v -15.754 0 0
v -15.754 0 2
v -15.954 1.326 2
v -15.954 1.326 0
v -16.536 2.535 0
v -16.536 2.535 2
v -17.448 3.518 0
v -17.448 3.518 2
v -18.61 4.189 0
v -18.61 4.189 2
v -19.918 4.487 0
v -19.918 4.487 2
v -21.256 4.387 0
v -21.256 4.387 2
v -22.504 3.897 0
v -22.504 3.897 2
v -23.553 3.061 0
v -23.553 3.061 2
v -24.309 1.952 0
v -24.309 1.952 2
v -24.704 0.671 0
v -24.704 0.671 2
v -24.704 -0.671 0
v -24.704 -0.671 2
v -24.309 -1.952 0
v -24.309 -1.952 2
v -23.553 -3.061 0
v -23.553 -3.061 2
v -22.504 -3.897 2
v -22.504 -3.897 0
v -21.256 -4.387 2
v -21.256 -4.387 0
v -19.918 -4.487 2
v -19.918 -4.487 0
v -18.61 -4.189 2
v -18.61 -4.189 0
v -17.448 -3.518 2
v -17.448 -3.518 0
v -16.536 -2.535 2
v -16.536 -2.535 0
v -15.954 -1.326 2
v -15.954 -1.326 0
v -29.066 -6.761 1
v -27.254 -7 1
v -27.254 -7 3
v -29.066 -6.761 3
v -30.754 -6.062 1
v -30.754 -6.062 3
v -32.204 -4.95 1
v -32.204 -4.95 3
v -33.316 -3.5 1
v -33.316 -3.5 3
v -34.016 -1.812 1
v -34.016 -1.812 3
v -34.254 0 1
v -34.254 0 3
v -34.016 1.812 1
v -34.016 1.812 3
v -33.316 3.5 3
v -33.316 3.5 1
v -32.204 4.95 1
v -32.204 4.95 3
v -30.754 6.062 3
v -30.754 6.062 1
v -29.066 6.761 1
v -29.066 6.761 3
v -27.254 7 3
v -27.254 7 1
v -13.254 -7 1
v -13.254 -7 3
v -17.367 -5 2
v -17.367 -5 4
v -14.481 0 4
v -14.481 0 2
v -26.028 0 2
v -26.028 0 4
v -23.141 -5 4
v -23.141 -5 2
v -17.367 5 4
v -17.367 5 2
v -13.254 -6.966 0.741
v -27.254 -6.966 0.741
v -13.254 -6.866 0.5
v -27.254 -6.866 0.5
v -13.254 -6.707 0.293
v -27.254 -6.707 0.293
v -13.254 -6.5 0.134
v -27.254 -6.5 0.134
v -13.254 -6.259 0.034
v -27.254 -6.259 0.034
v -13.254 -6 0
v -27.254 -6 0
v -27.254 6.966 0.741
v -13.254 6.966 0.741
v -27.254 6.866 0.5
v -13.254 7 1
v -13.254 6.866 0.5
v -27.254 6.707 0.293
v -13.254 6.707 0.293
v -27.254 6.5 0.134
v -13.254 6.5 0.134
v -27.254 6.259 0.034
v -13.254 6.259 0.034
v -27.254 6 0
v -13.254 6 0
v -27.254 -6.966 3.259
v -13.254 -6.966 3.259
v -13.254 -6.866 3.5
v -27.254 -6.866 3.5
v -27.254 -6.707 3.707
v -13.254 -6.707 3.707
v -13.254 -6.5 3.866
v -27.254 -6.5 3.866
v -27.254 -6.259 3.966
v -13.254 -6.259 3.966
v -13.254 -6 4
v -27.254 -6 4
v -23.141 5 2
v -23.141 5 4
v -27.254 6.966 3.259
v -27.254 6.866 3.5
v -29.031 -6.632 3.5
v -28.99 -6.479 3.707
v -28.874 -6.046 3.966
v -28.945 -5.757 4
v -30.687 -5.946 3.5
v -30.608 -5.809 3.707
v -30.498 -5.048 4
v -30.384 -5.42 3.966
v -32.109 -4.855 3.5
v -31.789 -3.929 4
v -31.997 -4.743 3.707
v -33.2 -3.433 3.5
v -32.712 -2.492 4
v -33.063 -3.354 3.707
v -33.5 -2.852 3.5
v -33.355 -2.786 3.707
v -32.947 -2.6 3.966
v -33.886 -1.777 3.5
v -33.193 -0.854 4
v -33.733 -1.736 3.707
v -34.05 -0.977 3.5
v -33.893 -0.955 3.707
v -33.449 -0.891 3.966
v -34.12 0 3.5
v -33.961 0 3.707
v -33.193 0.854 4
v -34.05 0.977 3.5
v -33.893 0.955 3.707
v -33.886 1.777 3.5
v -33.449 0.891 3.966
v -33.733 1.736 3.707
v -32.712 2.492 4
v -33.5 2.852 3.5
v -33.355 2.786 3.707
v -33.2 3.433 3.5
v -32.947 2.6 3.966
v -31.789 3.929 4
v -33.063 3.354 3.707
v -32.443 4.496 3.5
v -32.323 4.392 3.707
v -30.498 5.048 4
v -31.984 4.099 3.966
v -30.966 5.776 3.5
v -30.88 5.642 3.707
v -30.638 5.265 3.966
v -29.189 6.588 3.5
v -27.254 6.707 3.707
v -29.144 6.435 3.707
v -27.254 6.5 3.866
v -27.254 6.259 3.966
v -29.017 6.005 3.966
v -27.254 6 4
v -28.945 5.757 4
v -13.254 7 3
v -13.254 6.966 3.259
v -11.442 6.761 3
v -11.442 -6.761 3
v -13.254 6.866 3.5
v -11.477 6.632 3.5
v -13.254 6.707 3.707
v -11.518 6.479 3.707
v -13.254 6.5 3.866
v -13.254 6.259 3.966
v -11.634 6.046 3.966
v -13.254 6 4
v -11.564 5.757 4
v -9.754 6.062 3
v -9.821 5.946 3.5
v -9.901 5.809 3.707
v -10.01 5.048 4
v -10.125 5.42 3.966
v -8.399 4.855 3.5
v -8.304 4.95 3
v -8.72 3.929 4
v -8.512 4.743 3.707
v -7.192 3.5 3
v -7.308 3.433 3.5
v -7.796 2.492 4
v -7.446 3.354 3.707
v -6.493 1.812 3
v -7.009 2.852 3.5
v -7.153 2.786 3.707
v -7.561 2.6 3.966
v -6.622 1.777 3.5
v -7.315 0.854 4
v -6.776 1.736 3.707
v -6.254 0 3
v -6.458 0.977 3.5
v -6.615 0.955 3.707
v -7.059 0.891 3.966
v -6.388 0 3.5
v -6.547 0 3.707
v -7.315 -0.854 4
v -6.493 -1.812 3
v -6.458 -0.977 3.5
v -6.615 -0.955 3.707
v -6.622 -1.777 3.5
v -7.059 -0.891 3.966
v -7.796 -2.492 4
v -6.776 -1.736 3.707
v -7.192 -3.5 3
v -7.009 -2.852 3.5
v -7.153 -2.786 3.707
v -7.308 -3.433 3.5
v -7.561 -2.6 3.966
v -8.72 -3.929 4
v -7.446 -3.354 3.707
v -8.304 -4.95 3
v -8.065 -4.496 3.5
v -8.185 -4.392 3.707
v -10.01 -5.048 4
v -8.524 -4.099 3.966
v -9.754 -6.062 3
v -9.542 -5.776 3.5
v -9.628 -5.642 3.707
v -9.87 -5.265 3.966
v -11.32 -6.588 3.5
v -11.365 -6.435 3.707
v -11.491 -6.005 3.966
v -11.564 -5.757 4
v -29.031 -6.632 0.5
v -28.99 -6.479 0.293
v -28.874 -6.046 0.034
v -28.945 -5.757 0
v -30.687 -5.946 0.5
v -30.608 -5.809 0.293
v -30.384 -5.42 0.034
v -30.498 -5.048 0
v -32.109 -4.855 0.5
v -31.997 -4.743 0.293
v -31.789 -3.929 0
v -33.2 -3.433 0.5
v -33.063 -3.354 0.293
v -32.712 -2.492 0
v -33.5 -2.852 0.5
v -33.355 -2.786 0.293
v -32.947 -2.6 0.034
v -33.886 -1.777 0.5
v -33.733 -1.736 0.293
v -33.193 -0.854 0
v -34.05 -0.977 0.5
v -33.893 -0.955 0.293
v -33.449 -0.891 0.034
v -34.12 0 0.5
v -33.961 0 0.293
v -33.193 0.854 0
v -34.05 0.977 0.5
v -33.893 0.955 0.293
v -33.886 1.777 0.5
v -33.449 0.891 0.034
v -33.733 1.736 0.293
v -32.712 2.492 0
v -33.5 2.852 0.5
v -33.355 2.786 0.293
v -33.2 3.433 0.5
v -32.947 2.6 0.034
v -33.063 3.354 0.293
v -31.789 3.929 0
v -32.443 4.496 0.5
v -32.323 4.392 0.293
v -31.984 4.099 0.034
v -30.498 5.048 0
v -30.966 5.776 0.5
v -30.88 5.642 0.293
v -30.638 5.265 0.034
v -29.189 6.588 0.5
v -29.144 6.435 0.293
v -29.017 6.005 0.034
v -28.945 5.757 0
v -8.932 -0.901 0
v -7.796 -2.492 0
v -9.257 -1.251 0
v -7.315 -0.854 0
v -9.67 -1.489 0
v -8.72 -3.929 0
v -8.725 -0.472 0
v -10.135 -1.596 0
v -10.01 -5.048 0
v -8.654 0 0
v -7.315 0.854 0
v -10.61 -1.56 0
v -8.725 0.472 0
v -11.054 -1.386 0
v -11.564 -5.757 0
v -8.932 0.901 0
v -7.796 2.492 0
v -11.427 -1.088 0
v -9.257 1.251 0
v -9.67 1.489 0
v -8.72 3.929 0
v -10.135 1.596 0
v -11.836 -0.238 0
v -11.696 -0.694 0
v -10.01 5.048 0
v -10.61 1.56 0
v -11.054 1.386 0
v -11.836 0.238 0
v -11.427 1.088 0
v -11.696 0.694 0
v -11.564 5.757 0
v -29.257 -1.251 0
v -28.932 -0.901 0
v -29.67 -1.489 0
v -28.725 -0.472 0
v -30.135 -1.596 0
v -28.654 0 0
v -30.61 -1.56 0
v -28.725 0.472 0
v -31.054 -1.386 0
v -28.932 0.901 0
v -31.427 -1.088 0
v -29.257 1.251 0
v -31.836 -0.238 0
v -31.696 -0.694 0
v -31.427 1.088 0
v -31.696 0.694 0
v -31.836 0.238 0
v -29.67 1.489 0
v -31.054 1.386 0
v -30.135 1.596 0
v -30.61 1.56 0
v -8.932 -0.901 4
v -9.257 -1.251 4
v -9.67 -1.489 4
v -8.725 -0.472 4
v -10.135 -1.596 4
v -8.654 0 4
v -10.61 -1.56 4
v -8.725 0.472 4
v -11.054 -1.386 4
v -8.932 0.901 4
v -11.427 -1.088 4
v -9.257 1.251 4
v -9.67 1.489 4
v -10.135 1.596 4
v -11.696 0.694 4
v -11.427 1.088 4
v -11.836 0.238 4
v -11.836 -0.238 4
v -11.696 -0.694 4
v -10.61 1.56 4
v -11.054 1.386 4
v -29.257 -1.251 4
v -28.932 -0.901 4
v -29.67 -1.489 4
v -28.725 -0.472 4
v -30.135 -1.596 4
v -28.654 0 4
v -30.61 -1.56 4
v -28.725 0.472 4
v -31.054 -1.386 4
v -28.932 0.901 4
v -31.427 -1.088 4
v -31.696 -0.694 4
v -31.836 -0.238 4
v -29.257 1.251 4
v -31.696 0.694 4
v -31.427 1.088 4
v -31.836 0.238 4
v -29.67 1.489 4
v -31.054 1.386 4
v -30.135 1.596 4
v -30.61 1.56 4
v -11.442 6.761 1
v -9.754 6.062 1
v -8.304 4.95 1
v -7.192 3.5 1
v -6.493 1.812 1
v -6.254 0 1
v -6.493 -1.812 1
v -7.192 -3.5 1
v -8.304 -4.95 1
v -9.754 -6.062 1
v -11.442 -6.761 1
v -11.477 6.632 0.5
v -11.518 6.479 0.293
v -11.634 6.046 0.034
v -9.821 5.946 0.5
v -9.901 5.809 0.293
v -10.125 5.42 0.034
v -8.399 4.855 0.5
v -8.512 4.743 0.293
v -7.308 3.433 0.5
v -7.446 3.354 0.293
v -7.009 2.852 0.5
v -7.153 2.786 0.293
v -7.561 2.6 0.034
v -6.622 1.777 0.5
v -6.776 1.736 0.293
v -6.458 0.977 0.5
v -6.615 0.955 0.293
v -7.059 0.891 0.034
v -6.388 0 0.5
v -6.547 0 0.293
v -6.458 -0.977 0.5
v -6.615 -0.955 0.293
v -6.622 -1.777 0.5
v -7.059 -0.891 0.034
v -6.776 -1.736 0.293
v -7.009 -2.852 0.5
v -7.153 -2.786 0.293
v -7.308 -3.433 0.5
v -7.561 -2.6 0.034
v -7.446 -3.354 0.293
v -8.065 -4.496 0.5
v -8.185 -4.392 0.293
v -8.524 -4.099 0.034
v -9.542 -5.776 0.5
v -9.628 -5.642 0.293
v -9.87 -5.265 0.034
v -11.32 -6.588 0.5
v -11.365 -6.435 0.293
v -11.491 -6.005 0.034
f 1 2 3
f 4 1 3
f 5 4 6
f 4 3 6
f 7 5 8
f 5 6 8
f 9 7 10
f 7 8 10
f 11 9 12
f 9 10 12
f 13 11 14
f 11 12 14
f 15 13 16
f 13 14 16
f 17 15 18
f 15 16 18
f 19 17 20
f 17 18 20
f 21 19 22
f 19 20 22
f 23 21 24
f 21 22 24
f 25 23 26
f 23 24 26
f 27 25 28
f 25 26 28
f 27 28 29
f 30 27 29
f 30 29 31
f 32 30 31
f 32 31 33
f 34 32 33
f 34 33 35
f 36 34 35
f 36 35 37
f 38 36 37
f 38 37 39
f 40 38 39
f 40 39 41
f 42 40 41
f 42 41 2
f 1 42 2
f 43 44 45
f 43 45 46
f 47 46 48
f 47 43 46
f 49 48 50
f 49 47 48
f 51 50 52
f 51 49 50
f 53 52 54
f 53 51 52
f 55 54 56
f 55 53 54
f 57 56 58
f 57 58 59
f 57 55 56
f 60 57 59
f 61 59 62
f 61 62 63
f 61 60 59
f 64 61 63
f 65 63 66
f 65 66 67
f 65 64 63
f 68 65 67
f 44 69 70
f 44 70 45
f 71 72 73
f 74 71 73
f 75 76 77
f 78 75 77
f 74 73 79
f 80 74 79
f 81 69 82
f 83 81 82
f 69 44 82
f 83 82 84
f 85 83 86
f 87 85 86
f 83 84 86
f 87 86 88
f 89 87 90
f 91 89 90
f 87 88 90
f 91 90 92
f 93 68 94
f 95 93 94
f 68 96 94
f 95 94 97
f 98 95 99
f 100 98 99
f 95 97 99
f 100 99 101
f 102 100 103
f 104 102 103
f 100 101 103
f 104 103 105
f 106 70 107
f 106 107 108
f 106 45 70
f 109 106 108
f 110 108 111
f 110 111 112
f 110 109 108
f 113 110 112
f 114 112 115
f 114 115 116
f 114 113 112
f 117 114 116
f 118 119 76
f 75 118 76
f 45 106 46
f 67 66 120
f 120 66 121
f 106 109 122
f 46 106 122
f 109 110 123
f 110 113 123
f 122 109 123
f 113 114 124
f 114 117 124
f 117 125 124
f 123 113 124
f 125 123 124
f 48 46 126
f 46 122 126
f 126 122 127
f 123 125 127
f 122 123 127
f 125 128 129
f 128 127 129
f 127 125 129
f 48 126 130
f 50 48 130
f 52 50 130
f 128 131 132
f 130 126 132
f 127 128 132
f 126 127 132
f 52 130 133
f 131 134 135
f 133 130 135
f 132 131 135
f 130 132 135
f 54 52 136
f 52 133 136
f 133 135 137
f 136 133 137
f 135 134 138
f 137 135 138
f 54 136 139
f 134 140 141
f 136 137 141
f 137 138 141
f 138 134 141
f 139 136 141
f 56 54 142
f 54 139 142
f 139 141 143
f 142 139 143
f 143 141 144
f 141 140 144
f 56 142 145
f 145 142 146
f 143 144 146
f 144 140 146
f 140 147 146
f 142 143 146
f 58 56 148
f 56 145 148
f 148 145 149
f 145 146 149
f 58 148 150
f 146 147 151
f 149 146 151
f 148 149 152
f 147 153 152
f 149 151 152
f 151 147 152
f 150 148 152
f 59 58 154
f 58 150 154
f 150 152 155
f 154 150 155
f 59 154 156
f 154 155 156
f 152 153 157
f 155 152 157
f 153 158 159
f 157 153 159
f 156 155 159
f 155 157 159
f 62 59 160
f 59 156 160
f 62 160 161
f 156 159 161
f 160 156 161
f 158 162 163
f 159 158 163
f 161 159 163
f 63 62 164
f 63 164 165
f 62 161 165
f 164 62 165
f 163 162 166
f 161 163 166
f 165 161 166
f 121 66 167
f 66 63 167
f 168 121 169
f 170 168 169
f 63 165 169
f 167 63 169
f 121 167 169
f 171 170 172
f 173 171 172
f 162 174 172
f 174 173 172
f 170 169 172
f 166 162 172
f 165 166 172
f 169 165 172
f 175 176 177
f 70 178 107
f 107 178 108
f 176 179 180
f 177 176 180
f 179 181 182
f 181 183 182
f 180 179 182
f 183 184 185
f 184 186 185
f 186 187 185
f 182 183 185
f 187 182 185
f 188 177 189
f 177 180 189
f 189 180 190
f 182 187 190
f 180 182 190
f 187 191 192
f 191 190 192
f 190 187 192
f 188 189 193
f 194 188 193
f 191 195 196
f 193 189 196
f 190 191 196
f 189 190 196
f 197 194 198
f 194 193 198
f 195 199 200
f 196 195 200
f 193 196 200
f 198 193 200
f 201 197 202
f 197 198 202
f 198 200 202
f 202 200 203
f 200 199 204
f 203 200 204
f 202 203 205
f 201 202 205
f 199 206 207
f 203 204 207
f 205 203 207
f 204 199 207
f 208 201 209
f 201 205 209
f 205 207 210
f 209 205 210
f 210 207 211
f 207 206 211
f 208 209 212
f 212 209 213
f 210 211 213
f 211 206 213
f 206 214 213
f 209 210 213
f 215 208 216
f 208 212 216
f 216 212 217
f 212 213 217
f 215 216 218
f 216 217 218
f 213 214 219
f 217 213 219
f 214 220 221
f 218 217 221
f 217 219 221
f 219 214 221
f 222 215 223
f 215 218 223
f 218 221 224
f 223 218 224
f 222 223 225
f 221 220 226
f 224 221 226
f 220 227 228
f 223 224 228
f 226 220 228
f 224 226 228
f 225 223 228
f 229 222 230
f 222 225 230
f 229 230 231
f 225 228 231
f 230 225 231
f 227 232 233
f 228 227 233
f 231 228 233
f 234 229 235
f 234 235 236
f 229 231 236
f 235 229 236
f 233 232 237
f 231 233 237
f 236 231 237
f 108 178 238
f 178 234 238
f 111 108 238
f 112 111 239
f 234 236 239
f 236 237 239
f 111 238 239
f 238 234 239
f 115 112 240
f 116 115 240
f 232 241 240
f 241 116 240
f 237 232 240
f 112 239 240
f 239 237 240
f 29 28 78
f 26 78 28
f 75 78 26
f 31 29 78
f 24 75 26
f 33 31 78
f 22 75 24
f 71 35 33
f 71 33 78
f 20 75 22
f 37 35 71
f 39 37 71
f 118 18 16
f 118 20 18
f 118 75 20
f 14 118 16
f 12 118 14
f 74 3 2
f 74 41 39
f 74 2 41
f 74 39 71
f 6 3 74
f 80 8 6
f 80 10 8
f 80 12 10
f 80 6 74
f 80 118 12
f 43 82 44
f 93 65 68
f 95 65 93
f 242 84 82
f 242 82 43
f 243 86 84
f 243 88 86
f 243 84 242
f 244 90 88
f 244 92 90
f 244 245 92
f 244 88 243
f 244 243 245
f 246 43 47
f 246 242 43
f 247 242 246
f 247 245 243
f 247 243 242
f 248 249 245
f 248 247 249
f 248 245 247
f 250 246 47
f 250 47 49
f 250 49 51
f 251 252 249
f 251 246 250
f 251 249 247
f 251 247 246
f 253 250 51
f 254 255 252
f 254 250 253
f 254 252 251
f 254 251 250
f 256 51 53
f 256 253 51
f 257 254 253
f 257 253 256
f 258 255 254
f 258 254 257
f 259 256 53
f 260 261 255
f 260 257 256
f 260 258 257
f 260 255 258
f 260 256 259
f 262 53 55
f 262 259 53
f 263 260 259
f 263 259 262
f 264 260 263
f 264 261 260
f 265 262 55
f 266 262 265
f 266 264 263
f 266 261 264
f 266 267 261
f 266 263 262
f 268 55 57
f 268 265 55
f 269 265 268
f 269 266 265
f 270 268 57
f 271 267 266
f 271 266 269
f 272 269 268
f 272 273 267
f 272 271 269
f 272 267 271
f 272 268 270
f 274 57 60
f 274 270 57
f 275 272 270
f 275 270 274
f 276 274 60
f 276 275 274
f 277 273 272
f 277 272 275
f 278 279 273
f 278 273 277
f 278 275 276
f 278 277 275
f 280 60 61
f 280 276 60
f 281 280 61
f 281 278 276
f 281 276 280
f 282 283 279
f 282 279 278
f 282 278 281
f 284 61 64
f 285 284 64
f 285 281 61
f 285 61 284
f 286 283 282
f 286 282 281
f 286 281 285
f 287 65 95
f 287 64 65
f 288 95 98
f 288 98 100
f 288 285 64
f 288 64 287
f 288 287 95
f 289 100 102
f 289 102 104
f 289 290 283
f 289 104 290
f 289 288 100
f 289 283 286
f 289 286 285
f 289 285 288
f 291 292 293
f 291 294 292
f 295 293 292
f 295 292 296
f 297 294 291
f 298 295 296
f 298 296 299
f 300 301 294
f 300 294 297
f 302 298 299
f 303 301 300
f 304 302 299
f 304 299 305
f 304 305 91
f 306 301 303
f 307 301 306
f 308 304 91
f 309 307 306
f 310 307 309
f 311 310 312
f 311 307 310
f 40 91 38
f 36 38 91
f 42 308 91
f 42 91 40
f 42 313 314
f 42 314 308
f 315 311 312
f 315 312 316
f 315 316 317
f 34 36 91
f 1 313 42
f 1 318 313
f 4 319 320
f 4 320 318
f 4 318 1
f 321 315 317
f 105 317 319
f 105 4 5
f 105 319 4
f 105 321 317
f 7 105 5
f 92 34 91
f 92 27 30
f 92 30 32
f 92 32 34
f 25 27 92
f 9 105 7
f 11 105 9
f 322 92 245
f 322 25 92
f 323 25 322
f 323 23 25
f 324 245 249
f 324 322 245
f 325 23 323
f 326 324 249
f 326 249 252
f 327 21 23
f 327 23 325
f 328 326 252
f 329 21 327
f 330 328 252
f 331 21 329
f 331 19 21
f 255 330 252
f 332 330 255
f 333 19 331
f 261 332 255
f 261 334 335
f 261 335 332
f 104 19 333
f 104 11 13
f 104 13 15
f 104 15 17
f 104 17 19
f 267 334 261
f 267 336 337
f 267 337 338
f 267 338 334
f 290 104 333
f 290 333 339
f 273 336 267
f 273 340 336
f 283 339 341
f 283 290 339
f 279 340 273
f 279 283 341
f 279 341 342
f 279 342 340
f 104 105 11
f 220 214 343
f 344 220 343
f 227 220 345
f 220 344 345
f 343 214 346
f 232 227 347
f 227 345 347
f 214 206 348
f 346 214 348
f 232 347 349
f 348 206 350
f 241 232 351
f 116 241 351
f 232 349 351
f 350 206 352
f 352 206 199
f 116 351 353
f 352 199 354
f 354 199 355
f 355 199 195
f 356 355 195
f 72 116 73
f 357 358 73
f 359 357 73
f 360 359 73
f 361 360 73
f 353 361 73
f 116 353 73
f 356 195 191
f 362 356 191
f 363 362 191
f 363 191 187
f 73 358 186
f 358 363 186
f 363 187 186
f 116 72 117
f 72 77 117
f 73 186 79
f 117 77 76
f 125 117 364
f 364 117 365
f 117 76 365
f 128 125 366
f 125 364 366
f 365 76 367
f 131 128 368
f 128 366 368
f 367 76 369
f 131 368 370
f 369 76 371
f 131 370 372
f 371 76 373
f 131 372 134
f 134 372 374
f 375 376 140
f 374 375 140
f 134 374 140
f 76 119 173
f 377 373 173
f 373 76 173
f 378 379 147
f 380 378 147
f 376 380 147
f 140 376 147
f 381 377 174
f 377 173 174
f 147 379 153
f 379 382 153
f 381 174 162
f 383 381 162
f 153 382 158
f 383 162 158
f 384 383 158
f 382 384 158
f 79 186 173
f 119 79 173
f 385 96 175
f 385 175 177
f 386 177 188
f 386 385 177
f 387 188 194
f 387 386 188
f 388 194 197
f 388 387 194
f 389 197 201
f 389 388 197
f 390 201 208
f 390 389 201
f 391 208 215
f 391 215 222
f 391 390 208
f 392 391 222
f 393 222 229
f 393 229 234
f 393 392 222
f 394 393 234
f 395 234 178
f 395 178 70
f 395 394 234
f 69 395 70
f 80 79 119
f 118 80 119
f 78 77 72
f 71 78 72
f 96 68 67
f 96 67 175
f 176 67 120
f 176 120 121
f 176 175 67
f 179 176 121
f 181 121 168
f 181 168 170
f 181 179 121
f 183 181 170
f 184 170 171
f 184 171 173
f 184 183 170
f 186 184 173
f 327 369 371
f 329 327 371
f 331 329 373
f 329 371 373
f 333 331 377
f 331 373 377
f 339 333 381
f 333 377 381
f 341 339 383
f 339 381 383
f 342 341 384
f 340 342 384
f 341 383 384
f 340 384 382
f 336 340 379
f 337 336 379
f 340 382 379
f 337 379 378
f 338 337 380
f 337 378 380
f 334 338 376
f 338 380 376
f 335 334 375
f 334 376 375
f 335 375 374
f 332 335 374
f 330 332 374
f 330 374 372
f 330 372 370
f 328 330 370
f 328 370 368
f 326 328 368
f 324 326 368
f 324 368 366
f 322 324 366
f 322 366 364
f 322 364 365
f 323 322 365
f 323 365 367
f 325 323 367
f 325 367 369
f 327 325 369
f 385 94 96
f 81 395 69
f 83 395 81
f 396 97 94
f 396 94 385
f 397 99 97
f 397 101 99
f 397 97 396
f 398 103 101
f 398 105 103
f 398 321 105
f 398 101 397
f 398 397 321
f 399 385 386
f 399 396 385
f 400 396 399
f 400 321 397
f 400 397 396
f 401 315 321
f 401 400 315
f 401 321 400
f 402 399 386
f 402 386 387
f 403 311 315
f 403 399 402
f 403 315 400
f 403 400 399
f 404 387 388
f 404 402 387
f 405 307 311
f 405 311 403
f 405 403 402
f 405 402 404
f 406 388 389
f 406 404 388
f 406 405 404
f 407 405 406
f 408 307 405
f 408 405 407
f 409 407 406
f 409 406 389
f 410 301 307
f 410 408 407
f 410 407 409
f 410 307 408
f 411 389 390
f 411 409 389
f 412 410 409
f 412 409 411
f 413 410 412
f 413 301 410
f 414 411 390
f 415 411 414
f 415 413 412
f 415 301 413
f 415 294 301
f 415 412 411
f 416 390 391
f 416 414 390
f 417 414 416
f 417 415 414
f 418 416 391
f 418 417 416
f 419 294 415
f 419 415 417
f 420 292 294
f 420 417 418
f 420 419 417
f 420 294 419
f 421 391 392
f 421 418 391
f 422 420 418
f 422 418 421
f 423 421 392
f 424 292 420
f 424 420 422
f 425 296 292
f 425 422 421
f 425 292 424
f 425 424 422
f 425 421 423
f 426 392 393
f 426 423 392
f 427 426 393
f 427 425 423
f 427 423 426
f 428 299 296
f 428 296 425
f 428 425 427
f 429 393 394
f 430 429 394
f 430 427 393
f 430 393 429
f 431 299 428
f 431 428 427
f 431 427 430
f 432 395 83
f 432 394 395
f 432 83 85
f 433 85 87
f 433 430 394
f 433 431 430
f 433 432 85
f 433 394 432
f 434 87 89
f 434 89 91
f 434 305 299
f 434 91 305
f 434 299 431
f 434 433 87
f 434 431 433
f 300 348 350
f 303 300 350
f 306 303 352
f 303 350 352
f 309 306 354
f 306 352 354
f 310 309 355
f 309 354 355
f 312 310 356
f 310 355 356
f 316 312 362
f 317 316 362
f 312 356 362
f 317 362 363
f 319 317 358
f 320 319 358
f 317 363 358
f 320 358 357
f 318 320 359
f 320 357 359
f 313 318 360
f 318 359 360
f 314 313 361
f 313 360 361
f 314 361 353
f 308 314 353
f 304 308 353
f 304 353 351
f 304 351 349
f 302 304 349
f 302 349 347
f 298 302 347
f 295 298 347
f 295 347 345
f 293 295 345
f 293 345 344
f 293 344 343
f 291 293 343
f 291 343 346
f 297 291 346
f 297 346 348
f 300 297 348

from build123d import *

# Parameters (mm, degrees)
BOSS_EXTRU_1_DEPTH      = 4
ESQUISSE3_R             = 4.5
ESQUISSE3_R_2           = 1.6
ENL_V_MAT_EXTRU_1_DEPTH = 5
ENL_V_MAT_EXTRU_2_DEPTH = 2
CONG_1_R                = 1


with BuildPart() as part:
    # Esquisse1 → Boss.-Extru.1 (new body)
    with BuildSketch(Plane.XY):
        with BuildLine():
            Line((-27.254178511, 7), (-13.254178511, 7))
            ThreePointArc((-13.254178511, 7), (-6.254178511, 0), (-13.254178511, -7))
            Line((-13.254178511, -7), (-27.254178511, -7))
            ThreePointArc((-27.254178511, -7), (-34.254178511, 0), (-27.254178511, 7))
        make_face()
    extrude(amount=BOSS_EXTRU_1_DEPTH)

    # Esquisse3 → Enlèv. mat.-Extru.1 (cut, through all)
    with BuildSketch(Plane.XY.offset(4)):
        with Locations((-20.254178511, 0)):
            Circle(ESQUISSE3_R)
        with Locations((-30.254178511, 0)):
            Circle(ESQUISSE3_R_2)
        with Locations((-10.254178511, 0)):
            Circle(ESQUISSE3_R_2)
    extrude(amount=-ENL_V_MAT_EXTRU_1_DEPTH, mode=Mode.SUBTRACT)

    # Esquisse4 → Enlèv. mat.-Extru.2 (cut)
    with BuildSketch(Plane.XY.offset(4)):
        Polygon((-23.140929857, 5), (-26.027681203, 0), (-23.140929857, -5), (-17.367427165, -5), (-14.480675819, 0), (-17.367427165, 5), align=None)
    extrude(amount=-ENL_V_MAT_EXTRU_2_DEPTH, mode=Mode.SUBTRACT)

    # Congé1
    cong_1_edges = [part.edges().sort_by_distance(p)[0] for p in [
        (-6.254178511, 0, 4),
        (-20.254178511, 7, 4),
        (-34.254178511, 0, 4),
        (-20.254178511, 7, 0),
        (-6.254178511, 0, 0),
        (-20.254178511, -7, 0),
        (-34.254178511, 0, 0),
        (-20.254178511, -7, 4),
    ]]
    fillet(cong_1_edges, radius=CONG_1_R)


solid = part.part
